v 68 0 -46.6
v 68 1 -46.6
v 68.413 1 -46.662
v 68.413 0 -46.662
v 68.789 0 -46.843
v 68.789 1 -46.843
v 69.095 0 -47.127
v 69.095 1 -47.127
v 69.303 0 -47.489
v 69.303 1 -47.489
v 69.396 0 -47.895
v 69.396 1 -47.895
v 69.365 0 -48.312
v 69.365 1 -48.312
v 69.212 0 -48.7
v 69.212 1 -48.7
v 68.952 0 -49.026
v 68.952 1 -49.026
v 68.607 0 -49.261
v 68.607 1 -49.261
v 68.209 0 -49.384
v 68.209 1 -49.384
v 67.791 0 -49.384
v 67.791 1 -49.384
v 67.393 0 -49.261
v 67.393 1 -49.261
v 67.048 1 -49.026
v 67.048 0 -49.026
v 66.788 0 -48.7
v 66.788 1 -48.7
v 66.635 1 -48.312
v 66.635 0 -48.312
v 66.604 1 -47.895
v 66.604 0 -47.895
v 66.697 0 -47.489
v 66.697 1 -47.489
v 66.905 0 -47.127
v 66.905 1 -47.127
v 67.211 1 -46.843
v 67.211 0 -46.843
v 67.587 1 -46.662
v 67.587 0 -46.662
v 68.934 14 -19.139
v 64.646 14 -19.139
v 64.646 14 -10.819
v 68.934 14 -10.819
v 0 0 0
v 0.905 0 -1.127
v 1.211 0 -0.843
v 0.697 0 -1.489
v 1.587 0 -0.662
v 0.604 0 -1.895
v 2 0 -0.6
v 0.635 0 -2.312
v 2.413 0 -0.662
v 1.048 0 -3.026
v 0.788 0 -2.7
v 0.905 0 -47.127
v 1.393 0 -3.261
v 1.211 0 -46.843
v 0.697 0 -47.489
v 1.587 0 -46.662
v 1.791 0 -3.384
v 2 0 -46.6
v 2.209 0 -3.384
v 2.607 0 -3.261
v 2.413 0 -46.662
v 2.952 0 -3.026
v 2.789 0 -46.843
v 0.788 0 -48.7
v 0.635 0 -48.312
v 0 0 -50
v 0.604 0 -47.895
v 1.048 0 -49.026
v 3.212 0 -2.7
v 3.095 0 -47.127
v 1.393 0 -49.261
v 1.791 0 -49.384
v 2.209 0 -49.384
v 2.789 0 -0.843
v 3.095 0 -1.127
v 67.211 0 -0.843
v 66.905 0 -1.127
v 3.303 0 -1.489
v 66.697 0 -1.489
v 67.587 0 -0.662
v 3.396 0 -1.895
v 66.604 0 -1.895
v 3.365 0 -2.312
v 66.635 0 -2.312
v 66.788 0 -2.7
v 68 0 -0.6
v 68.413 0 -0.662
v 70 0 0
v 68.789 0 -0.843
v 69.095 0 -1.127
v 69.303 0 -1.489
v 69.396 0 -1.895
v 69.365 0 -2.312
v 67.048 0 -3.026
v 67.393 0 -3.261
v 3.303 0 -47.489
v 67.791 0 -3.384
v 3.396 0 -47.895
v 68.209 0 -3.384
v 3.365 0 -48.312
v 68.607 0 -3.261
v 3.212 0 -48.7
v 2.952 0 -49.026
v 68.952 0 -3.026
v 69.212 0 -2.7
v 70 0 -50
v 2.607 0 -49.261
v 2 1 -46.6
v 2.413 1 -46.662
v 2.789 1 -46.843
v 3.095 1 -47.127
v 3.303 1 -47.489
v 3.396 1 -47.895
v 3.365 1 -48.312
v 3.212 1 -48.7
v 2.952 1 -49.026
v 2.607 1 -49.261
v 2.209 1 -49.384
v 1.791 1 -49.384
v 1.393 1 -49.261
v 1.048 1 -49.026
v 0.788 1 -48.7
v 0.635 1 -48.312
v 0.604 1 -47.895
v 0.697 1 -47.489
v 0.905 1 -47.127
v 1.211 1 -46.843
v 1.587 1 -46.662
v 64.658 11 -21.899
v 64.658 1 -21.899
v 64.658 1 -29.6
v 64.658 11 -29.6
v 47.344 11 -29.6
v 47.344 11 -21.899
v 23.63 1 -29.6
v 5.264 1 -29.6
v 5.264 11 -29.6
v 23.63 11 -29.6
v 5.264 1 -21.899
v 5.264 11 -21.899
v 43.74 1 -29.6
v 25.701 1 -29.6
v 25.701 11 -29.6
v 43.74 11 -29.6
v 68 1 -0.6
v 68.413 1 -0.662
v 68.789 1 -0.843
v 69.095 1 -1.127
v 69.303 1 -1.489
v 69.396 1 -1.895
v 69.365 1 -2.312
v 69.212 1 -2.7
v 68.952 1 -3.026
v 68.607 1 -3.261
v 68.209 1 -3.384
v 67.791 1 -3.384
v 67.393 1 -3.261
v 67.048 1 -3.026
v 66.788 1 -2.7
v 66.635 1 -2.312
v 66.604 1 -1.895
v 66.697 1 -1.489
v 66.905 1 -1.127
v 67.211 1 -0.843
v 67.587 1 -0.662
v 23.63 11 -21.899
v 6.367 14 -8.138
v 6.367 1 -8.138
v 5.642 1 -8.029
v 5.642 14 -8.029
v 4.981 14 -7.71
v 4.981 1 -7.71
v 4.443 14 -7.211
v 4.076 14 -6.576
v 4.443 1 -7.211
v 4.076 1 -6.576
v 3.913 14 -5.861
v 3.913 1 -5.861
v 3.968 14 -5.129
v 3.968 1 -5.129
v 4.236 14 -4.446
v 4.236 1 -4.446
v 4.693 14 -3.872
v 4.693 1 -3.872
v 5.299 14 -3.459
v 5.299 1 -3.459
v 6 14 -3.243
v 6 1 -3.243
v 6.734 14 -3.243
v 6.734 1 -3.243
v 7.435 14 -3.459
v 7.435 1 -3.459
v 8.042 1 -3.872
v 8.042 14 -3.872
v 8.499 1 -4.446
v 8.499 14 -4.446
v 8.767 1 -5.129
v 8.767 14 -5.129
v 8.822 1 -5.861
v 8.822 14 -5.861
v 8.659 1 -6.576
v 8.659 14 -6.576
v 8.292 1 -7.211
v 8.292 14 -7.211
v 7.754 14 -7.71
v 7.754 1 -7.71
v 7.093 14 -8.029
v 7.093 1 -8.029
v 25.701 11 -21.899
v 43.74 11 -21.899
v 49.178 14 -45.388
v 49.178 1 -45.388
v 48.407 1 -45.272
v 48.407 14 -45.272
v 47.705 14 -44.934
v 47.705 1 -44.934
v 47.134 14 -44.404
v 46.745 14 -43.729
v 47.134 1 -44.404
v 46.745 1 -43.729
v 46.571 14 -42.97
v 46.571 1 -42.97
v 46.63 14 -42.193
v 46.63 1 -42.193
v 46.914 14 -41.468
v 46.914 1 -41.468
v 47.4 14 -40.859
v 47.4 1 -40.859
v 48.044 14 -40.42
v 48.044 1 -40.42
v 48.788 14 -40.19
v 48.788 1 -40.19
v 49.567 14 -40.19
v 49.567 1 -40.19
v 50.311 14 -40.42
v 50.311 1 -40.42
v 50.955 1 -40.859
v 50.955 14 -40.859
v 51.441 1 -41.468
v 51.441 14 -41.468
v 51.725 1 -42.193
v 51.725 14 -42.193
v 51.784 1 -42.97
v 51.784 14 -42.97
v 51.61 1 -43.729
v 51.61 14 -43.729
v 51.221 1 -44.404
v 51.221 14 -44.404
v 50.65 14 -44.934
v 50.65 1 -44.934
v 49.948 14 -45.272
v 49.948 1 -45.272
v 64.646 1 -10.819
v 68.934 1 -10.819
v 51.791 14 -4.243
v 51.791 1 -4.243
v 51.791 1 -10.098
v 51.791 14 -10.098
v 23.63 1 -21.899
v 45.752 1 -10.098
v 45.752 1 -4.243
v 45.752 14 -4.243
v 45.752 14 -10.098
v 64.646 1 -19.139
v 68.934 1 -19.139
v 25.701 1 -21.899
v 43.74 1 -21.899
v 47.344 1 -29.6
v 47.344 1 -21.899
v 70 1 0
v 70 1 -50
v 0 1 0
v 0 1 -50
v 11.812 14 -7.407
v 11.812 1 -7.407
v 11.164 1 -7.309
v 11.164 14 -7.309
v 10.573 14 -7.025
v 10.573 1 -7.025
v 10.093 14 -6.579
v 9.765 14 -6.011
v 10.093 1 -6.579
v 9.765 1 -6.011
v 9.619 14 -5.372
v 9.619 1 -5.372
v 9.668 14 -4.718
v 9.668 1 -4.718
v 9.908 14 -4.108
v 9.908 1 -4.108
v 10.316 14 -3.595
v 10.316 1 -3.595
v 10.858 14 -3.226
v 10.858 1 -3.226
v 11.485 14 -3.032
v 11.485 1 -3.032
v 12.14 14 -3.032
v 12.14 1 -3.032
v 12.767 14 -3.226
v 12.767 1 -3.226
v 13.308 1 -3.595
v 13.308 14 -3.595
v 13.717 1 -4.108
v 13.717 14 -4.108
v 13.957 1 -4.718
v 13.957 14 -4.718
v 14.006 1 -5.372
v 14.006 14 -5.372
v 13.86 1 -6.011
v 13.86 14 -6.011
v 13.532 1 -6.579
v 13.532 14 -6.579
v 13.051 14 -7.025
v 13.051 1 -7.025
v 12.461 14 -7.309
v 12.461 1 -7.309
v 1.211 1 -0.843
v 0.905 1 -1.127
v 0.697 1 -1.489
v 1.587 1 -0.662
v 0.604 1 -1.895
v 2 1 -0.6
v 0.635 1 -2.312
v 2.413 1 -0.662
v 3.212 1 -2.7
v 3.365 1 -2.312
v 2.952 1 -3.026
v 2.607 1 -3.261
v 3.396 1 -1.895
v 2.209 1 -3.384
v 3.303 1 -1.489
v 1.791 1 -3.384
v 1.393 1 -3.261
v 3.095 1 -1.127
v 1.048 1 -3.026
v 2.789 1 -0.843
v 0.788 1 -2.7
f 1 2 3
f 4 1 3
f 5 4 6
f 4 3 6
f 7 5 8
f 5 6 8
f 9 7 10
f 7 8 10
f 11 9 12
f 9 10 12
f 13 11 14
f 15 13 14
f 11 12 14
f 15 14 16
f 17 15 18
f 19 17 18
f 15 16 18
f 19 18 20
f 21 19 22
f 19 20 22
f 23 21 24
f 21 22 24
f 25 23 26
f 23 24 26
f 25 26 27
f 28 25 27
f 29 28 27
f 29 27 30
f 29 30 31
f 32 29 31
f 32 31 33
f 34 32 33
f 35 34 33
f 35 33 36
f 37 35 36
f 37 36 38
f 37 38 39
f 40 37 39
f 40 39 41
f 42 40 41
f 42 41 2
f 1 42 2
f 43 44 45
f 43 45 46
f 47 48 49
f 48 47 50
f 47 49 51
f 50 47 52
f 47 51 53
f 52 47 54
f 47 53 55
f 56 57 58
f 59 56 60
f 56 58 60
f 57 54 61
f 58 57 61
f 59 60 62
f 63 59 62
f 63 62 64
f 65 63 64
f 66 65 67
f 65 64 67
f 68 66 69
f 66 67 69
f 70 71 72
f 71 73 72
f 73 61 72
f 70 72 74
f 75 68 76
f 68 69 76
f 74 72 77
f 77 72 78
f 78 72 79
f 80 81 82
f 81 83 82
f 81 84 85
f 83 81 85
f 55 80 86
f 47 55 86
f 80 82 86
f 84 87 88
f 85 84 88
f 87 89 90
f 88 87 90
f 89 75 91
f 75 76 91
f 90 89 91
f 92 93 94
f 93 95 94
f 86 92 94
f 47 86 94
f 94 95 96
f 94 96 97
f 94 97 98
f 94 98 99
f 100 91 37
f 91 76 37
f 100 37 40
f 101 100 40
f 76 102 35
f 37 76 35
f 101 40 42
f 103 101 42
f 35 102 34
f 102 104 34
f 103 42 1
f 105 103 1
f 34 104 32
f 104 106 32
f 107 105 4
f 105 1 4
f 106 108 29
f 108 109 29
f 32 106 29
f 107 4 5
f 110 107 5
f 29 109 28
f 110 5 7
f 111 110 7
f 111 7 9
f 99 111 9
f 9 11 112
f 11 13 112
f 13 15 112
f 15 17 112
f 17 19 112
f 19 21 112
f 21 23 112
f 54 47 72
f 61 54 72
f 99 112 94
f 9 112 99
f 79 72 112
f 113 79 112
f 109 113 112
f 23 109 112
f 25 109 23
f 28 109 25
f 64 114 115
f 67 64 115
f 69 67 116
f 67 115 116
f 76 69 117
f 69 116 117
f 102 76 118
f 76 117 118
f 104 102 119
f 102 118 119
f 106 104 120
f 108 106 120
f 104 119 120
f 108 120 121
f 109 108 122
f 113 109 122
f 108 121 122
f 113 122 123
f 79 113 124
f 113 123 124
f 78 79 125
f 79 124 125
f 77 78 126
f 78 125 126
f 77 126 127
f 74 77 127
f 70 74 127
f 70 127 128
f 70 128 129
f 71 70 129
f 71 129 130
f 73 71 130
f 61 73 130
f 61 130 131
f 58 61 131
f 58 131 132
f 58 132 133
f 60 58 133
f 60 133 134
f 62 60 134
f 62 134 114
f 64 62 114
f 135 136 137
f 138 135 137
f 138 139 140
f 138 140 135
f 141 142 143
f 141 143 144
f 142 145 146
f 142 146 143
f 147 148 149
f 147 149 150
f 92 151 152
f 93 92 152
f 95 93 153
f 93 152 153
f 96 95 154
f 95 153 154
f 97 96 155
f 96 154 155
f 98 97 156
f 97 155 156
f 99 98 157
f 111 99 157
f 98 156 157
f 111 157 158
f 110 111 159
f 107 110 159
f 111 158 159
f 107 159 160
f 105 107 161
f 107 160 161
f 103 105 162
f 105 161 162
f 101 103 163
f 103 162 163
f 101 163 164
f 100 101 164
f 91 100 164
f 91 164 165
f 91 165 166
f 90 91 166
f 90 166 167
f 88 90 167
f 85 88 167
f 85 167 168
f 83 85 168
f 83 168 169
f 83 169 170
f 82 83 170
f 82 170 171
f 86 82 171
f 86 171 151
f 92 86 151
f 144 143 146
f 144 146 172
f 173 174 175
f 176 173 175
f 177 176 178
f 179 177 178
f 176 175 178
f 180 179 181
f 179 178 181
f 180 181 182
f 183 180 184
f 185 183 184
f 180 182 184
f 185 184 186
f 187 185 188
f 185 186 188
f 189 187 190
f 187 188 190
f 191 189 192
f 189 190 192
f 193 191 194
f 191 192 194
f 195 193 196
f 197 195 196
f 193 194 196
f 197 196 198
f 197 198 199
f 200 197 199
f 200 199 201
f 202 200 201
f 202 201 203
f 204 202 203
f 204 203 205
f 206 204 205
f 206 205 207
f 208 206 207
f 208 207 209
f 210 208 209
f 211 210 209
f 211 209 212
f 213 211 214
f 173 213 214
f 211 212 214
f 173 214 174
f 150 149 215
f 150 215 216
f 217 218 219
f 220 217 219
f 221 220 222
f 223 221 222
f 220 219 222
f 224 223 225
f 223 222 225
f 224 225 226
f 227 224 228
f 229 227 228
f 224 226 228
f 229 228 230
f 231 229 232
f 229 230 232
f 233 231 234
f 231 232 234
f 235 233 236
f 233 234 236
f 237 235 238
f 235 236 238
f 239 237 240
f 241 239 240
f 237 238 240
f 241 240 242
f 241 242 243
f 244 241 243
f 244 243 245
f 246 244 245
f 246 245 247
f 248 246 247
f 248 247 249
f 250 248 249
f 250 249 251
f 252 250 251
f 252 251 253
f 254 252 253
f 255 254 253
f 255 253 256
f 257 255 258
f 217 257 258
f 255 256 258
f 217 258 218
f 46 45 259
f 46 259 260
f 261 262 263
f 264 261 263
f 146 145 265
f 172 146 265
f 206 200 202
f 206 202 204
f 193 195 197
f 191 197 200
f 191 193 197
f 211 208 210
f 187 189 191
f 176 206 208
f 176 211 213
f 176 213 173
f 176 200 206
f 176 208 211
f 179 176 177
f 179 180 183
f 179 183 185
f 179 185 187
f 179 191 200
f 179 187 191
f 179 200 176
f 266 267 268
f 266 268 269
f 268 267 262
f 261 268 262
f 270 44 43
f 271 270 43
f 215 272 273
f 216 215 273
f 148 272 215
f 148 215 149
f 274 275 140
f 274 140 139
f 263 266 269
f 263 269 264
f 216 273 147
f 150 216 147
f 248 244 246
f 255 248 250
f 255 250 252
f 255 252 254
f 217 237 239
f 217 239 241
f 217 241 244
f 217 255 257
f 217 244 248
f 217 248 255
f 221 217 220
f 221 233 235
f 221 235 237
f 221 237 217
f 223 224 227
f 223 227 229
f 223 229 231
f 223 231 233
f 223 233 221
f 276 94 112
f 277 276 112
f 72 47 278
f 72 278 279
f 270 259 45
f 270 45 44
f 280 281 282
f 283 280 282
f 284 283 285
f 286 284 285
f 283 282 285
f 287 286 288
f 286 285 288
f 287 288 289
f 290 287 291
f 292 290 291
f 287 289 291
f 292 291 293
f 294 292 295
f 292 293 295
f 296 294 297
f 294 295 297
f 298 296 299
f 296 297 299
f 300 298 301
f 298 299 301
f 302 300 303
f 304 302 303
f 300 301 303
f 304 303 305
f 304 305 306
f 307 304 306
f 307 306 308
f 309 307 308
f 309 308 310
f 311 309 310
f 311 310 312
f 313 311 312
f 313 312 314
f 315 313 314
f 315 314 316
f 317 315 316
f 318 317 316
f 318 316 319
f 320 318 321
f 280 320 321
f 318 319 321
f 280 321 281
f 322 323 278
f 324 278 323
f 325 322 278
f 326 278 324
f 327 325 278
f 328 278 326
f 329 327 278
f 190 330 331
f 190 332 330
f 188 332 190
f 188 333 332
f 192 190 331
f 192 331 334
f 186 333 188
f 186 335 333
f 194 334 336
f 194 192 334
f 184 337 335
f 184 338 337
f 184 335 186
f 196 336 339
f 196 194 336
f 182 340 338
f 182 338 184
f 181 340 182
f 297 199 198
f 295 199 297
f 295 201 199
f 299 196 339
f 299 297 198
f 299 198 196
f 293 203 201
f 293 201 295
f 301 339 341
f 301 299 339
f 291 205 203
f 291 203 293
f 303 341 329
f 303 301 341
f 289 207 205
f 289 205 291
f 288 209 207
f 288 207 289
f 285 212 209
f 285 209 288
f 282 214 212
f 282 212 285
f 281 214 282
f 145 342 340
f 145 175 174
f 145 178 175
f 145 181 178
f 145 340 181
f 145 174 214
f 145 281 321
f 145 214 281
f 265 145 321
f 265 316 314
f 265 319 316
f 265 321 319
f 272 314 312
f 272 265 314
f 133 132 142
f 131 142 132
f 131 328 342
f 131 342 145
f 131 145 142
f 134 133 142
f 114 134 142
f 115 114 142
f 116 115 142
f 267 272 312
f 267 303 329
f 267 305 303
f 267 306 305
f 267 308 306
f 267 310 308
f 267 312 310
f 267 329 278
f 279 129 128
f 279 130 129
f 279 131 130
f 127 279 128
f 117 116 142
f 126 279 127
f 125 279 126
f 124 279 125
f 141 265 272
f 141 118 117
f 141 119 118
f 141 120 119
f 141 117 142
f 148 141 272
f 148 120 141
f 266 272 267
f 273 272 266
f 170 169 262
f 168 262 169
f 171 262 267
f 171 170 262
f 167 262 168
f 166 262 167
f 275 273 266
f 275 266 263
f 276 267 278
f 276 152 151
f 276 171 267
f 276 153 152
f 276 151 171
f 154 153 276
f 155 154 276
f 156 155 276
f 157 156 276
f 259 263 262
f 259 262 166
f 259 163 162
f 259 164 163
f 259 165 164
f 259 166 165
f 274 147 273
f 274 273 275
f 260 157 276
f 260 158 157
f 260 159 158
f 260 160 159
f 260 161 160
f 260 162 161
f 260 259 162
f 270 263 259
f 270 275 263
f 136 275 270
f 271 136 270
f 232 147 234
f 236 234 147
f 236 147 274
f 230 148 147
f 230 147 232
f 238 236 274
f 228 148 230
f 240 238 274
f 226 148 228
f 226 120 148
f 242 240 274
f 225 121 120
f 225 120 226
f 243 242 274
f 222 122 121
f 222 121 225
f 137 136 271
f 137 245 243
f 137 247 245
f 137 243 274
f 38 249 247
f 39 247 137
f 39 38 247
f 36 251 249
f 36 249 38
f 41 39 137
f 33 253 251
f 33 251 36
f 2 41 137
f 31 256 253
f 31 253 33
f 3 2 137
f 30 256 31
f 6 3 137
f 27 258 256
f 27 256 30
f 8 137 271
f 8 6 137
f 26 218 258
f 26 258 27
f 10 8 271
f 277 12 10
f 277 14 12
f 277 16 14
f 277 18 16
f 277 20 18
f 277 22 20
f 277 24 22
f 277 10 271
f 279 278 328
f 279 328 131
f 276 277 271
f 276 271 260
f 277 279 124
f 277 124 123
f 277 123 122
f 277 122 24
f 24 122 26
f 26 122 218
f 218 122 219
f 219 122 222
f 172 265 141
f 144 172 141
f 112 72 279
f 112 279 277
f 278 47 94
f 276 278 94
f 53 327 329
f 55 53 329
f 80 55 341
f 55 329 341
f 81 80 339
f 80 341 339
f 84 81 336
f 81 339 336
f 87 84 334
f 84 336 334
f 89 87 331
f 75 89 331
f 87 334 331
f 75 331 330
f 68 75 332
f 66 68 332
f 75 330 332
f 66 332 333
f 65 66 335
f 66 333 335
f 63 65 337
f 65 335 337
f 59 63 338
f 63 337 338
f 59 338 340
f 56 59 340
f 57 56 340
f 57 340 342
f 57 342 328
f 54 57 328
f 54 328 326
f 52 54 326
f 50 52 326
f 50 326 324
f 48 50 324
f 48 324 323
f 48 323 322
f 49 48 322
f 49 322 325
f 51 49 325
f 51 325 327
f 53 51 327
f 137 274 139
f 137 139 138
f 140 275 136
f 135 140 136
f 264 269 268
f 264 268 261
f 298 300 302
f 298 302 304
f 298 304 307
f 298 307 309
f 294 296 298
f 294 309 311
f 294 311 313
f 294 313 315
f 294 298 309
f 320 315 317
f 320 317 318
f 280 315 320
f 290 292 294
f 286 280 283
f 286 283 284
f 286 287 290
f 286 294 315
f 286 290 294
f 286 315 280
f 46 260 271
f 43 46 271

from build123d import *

# Parameters (mm, degrees)
SKETCH1_W           = 70
SKETCH1_H           = 50
BOSS_EXTRUDE1_DEPTH = 1
SKETCH2_R           = 1.4
CUT_EXTRUDE1_DEPTH  = 87.029064856
SKETCH3_W           = 18.365703091
SKETCH3_H           = 7.700561822
SKETCH3_W_2         = 18.038456085
SKETCH3_W_3         = 17.313956014
BOSS_EXTRUDE2_DEPTH = 10
SKETCH4_R           = 2.199397545
SKETCH4_R_2         = 2.613331078
SKETCH4_W           = 6.039158021
SKETCH4_H           = 5.855225109
SKETCH4_W_2         = 4.288386861
SKETCH4_H_2         = 8.320722996
BOSS_EXTRUDE3_DEPTH = 13
SKETCH5_R           = 2.461468561
BOSS_EXTRUDE4_DEPTH = 13


with BuildPart() as part:
    # Sketch1 → Boss-Extrude1 (new body)
    with BuildSketch(Plane(origin=(0, 0, 0), x_dir=(1, 0, 0), z_dir=(0, 1, 0))):
        with Locations((35, 25)):
            Rectangle(SKETCH1_W, SKETCH1_H)
    extrude(amount=BOSS_EXTRUDE1_DEPTH)

    # Sketch2 → Cut-Extrude1 (cut, through all)
    with BuildSketch(Plane(origin=(0, 1, 0), x_dir=(1, 0, 0), z_dir=(0, 1, 0))):
        with Locations(Location((2, 48, 0), (0, 0, 270))):
            Circle(SKETCH2_R)
        with Locations(Location((68, 48, 0), (0, 0, 270))):
            Circle(SKETCH2_R)
        with Locations(Location((68, 2, 0), (0, 0, 270))):
            Circle(SKETCH2_R)
        with Locations(Location((2, 2, 0), (0, 0, 270))):
            Circle(SKETCH2_R)
    extrude(amount=-CUT_EXTRUDE1_DEPTH, mode=Mode.SUBTRACT)

    # Sketch3 → Boss-Extrude2 (add)
    with BuildSketch(Plane(origin=(0, 1, 0), x_dir=(1, 0, 0), z_dir=(0, 1, 0))):
        with Locations((14.447202749, 25.749679834)):
            Rectangle(SKETCH3_W, SKETCH3_H)
        with Locations((34.720477754, 25.749679834)):
            Rectangle(SKETCH3_W_2, SKETCH3_H)
        with Locations((56.000727736, 25.749679834)):
            Rectangle(SKETCH3_W_3, SKETCH3_H)
    extrude(amount=BOSS_EXTRUDE2_DEPTH)

    # Sketch4 → Boss-Extrude3 (add)
    with BuildSketch(Plane(origin=(0, 1, 0), x_dir=(1, 0, 0), z_dir=(0, 1, 0))):
        with Locations(Location((11.812429649, 5.207282589, 0), (0, 0, 90))):
            Circle(SKETCH4_R)
        with Locations(Location((49.177509177, 42.774595264, 0), (0, 0, 90))):
            Circle(SKETCH4_R_2)
        with Locations((48.771261245, 7.170254424)):
            Rectangle(SKETCH4_W, SKETCH4_H)
        with Locations((66.789850866, 14.979105773)):
            Rectangle(SKETCH4_W_2, SKETCH4_H_2)
    extrude(amount=BOSS_EXTRUDE3_DEPTH)

    # Sketch5 → Boss-Extrude4 (add)
    with BuildSketch(Plane(origin=(0, 1, 0), x_dir=(1, 0, 0), z_dir=(0, 1, 0))):
        with Locations(Location((6.367279466, 5.676618651, 0), (0, 0, 90))):
            Circle(SKETCH5_R)
    extrude(amount=BOSS_EXTRUDE4_DEPTH)


solid = part.part
